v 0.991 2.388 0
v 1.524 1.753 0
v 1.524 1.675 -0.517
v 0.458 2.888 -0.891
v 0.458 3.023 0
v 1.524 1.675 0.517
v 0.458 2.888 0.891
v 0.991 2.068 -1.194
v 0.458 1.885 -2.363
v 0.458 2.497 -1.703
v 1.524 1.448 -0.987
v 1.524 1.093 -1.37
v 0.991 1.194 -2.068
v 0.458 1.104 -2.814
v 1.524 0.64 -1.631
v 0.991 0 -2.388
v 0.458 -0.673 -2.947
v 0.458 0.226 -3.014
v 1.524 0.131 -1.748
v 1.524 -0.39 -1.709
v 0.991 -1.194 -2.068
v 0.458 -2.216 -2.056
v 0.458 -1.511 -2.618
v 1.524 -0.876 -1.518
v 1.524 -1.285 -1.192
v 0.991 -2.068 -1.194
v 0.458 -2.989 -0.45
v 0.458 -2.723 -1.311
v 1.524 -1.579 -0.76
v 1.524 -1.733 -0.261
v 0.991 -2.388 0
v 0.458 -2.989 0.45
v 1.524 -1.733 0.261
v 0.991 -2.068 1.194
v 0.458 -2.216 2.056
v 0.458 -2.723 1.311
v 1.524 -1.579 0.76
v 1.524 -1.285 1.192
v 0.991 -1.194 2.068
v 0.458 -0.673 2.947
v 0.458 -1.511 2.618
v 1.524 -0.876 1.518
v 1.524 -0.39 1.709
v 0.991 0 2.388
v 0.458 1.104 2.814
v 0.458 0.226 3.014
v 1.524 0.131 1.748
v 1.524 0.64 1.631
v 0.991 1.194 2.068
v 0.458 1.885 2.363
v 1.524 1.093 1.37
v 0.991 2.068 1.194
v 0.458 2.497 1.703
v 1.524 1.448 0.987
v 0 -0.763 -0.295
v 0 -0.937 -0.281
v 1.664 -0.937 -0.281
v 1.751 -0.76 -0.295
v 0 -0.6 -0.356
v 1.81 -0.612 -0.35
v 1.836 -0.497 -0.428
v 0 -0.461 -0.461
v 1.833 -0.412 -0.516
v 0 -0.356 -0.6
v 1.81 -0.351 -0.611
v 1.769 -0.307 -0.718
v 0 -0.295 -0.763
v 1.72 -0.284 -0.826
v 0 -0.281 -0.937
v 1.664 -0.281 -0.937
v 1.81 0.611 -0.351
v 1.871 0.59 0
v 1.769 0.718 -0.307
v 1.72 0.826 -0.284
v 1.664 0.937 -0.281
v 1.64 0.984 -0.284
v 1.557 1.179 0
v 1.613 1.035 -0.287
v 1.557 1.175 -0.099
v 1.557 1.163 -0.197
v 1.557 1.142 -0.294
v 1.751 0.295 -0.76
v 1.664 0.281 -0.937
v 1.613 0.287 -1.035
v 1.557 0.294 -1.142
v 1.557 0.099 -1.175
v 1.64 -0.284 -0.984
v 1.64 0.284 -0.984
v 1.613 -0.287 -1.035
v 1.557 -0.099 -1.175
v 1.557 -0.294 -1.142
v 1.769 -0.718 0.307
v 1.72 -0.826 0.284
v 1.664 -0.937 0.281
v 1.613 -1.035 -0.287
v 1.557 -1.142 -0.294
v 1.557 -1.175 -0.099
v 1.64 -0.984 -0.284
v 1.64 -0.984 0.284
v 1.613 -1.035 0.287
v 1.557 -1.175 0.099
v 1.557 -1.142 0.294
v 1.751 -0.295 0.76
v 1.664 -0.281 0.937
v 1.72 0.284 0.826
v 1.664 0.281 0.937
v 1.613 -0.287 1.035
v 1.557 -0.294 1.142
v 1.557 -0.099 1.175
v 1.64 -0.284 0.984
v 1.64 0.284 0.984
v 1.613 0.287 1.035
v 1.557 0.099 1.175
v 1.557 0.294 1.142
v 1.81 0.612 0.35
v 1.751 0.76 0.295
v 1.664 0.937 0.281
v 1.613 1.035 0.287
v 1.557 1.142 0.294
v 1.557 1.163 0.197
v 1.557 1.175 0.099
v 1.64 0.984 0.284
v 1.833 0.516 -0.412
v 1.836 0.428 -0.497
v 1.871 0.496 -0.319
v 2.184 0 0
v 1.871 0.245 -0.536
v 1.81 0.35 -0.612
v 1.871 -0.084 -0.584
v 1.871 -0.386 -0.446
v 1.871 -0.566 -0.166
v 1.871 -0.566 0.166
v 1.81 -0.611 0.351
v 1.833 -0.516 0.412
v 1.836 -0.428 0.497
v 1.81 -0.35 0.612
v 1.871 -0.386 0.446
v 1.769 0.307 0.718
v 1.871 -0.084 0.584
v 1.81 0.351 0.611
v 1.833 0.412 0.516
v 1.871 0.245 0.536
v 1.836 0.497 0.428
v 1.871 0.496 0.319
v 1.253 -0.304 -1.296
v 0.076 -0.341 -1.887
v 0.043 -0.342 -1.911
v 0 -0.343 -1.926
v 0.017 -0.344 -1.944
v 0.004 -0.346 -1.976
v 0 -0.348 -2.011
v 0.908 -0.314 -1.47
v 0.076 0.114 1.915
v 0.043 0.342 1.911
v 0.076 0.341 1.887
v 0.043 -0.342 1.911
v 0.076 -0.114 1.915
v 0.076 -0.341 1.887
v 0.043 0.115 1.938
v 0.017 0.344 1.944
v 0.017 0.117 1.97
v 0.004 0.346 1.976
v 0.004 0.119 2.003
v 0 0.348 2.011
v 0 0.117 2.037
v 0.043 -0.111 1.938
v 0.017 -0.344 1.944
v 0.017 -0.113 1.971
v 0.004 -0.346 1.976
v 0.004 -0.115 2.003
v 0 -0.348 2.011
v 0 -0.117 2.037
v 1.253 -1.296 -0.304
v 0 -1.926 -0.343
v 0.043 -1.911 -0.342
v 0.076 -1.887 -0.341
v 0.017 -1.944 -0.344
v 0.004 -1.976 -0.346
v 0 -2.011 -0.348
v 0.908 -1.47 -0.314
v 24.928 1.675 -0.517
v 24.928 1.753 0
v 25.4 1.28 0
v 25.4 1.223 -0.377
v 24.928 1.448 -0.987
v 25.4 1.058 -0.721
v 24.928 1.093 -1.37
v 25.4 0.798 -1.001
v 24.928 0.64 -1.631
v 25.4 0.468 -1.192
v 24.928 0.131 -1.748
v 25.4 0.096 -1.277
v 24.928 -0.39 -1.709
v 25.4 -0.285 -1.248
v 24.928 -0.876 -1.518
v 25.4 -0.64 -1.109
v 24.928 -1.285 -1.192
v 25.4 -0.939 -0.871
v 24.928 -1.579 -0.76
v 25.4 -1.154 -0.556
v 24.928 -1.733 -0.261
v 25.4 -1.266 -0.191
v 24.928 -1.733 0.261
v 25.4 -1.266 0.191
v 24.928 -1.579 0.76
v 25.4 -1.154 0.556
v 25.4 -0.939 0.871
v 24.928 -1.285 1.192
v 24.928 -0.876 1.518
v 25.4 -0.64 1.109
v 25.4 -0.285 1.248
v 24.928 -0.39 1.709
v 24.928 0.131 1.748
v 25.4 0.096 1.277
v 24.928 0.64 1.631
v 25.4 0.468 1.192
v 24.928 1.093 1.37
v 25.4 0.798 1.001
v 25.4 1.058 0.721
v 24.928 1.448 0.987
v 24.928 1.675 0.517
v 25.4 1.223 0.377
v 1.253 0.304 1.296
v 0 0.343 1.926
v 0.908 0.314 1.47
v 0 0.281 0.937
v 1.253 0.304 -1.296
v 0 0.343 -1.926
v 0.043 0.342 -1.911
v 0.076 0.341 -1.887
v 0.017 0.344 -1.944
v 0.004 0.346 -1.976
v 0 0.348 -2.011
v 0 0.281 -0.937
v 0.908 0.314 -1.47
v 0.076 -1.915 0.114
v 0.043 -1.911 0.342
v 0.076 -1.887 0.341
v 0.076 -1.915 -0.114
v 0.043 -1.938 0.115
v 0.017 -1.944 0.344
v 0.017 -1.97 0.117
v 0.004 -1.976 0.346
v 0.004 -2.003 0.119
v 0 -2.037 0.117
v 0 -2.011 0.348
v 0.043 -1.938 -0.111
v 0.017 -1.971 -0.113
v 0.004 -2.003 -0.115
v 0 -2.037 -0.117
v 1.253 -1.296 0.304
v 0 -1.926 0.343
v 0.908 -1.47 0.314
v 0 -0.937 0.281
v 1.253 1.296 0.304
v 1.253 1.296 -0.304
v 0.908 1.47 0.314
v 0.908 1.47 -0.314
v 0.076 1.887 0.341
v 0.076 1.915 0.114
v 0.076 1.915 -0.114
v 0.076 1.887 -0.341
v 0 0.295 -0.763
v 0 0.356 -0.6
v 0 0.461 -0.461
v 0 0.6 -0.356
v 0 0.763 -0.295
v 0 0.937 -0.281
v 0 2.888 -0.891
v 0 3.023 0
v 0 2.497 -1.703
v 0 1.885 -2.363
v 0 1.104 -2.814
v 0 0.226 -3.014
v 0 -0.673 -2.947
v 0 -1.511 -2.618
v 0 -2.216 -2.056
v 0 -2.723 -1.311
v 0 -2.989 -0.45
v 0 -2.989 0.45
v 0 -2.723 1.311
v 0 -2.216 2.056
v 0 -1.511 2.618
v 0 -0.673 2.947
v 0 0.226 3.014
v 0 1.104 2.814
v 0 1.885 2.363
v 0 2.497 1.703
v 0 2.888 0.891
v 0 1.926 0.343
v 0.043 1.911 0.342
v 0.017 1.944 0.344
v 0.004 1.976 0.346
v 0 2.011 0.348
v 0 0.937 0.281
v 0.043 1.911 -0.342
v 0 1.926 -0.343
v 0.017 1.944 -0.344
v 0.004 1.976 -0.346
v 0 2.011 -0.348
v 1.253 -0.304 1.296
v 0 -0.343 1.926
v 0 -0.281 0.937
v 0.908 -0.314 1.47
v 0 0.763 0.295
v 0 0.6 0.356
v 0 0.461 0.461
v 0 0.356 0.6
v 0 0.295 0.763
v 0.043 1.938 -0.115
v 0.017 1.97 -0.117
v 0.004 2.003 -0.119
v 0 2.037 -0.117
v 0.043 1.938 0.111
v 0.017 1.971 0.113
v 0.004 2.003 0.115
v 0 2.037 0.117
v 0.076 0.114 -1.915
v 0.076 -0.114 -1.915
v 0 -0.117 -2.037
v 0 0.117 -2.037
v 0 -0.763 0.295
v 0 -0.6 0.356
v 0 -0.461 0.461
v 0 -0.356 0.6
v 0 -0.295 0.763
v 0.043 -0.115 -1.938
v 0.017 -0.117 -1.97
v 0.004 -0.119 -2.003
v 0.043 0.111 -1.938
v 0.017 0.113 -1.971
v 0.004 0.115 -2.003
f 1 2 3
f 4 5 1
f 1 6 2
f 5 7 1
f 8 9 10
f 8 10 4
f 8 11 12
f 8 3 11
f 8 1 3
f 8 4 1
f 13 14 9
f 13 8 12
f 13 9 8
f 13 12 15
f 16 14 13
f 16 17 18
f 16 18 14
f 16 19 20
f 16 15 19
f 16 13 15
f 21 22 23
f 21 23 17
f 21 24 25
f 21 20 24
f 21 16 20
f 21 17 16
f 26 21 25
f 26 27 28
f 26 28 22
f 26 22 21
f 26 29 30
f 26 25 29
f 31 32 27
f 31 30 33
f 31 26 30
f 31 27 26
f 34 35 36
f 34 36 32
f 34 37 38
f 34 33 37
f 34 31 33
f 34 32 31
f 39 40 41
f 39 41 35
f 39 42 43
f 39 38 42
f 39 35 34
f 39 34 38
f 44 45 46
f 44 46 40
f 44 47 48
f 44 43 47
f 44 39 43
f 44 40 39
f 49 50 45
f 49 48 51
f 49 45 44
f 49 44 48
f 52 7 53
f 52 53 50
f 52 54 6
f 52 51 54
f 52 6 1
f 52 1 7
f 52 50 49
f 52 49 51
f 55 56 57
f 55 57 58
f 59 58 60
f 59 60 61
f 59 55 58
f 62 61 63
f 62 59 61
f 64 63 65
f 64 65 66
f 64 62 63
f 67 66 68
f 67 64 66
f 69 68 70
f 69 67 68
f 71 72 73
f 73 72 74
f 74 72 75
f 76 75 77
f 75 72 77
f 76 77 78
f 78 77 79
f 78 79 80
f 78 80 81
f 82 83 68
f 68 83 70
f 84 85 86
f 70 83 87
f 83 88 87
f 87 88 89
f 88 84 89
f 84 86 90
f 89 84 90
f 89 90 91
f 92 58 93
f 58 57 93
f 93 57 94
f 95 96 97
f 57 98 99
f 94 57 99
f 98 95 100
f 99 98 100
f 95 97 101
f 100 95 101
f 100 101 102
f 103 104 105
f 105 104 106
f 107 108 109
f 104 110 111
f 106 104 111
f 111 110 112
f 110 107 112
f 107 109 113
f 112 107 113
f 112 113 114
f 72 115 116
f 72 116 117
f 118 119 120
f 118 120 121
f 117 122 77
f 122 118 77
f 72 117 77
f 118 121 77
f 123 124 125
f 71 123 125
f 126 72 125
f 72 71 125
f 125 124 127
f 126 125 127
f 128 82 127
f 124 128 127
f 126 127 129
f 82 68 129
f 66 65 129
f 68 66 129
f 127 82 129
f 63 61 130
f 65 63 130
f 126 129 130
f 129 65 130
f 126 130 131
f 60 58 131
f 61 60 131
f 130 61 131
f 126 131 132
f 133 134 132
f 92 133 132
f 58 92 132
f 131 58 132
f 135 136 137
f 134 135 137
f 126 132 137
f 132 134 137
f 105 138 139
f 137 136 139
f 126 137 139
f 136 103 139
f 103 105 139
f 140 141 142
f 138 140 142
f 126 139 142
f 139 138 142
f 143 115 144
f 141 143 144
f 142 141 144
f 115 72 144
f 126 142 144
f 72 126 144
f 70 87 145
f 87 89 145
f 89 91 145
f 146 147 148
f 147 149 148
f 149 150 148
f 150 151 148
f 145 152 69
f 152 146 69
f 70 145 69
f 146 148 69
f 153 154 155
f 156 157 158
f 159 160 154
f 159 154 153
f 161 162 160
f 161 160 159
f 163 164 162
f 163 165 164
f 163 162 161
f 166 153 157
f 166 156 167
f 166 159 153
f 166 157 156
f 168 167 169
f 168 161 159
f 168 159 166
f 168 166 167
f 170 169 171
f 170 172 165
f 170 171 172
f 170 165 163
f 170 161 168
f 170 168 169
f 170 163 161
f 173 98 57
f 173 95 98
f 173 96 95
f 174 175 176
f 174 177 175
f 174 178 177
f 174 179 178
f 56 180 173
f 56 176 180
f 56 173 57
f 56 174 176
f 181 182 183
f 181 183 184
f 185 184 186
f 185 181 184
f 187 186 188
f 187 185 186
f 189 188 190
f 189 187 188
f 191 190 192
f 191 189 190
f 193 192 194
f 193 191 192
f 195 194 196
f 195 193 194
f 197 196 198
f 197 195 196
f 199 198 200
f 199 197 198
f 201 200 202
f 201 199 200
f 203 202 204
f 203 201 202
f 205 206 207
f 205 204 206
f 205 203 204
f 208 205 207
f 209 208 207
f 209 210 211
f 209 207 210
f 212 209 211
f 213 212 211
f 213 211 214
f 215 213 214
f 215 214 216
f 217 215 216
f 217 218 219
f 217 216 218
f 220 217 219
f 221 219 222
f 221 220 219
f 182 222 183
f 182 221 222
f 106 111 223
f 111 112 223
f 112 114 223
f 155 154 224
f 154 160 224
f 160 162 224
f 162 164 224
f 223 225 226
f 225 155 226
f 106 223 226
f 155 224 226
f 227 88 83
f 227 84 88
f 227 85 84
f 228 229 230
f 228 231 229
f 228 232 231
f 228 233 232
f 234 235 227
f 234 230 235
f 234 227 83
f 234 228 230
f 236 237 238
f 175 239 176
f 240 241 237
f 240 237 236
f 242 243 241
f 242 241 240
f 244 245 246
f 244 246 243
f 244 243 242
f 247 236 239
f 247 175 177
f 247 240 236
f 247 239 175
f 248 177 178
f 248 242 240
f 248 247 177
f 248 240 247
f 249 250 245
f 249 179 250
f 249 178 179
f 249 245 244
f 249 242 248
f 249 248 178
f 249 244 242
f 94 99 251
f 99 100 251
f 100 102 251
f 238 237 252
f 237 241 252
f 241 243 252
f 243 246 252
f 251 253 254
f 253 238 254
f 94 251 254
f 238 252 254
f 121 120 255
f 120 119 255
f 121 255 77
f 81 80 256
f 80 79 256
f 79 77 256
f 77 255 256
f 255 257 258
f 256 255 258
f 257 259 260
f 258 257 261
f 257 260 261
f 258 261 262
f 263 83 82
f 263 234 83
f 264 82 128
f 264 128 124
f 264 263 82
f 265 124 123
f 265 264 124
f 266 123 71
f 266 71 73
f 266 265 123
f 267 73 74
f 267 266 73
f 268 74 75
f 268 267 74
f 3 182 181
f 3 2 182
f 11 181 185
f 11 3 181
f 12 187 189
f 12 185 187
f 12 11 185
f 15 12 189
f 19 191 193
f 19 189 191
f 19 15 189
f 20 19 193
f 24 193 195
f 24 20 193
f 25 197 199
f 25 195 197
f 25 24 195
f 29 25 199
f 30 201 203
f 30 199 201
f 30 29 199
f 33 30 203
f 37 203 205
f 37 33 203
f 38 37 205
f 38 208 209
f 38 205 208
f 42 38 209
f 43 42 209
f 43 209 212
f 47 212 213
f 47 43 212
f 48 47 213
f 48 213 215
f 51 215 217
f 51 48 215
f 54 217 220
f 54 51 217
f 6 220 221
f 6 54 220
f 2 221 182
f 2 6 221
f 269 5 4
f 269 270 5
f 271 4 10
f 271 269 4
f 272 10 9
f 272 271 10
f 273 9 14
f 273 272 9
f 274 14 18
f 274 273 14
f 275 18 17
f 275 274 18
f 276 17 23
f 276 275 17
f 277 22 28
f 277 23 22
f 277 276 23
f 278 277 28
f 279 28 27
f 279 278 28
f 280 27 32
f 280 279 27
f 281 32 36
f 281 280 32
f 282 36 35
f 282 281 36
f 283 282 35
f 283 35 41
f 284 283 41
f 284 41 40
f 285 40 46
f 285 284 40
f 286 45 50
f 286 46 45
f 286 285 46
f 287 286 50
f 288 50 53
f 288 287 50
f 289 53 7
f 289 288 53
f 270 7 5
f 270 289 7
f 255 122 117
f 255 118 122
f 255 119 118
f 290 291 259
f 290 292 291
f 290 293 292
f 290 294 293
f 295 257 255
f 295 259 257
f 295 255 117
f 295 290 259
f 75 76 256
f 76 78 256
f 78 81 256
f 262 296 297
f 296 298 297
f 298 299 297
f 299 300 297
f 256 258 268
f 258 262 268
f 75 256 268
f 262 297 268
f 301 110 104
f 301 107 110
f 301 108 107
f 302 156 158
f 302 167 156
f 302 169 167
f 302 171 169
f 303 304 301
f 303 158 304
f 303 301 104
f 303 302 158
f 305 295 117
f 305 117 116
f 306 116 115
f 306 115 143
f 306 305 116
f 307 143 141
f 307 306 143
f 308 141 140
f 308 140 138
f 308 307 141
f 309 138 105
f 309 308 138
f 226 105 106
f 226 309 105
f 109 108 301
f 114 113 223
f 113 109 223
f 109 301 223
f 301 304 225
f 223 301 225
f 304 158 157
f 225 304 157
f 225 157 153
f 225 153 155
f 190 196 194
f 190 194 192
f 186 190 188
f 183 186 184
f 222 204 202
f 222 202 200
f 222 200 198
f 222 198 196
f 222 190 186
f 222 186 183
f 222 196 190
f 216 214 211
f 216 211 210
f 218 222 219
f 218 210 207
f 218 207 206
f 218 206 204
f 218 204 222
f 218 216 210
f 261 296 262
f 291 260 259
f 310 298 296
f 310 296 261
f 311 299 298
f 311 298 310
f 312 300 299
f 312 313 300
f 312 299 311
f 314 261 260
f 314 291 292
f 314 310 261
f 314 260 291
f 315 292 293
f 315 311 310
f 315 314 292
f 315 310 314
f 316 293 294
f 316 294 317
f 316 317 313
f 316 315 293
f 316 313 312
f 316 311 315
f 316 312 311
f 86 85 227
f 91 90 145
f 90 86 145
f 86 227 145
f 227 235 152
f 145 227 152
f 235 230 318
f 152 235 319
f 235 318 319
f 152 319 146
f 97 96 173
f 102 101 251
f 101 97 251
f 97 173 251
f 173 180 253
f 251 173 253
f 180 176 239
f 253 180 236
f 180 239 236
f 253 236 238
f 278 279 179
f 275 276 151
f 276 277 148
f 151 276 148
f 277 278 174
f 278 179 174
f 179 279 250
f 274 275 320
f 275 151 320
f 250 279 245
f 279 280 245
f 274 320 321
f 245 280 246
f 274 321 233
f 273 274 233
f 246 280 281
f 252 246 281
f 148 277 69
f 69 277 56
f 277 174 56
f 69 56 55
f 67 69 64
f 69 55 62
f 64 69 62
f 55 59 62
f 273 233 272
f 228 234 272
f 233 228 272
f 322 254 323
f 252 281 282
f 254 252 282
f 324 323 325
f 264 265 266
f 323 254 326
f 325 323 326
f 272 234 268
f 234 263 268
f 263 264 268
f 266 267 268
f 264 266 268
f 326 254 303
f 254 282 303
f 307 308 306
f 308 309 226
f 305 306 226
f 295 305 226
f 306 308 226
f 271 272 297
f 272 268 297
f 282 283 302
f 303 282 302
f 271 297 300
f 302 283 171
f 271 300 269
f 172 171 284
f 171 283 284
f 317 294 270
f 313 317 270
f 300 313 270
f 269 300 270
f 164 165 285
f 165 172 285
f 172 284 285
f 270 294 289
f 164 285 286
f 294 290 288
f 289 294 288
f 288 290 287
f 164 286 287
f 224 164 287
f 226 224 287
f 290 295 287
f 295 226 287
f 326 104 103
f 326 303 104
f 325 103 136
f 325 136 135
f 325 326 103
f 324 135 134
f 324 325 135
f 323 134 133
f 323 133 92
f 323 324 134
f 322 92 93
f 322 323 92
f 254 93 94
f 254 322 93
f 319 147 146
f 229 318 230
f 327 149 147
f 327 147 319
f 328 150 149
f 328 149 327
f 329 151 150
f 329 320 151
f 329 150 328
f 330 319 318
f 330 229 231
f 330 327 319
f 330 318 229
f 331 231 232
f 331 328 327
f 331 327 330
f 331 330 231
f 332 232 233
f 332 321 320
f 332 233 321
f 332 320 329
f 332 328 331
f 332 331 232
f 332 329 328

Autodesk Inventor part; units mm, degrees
ref_plane "YZ Plane" through (0, 0, 0) normal (1, 0, 0) x (0, 1, 0)
ref_plane "XZ Plane" through (0, 0, 0) normal (0, 1, 0) x (-1, 0, 0)
sketch "Sketch1" plane through (0, 0, 0) normal (0, 0, 1) x (1, 0, 0)
  line L0 (2.1844, 0) -> (25.4, 0)
  line L1 (25.4, 0) -> (25.4, 1.7526)
  line L2 (25.4, 1.7526) -> (1.524, 1.7526)
  line L3 (0.4583, 3.0226) -> (0, 3.0226)
  line L4 (-5.08, 0) -> (30.48, 0) projected
  line L5 (0, -0.6045) -> (0, 3.6271) projected
  line L6 (0, 1.9558) -> (1.5573, 1.1793)
  line L7 (1.5573, 1.1793) -> (2.1844, 0)
  line L8 (1.524, 1.7526) -> (0.4583, 3.0226)
  line L9 (0, 3.0226) -> (0, 1.9558)
  dimension "d2" = 3.5052
  dimension "d3" = 6.0452
  dimension "d4" = 2.1844
  dimension "d5" = 3.9116
  dimension "d6" = 26.5
  dimension "d7" = 62
  dimension "d13" = 50
  dimension "d14" = 1.524
  dimension "d15" = 25.4
revolve "Body" add sketch "Sketch1" angle 360 about axis through (2.1844, 0, 0) along (1, 0, 0) contours L7 L6 L5 L3 L8 L2 L1 L0
sketch "Sketch2" plane through (0, 0, 0) normal (-1, 0, 0) x (0, 0, 1)
  line L0 (0, -4.2316) -> (0, 4.2316) projected
  line L1 (-4.2316, 0) -> (4.2316, 0) projected
  line L2 (0, 1.9558) -> (0, 0) construction
  line L3 (0, 0) -> (1.9558, 0) construction
  arc A0 (0.6519, 0) -> (0, 0.6519) centre (0, 0) ccw
  line L4 (0, 0) -> (0.7947, 0.7947) construction
  arc A1 (0.9779, 0) -> (0, 0.9779) centre (0, 0) ccw construction
  line L5 (0.3429, 1.9255) -> (0.2811, 0.9366)
  line L6 (1.9255, 0.3429) -> (0.9366, 0.2811)
  arc A2 (0.2811, 0.9366) -> (0.9366, 0.2811) centre (0.8981, 0.8981) ccw
  arc A3 (1.9558, 0) -> (1.9255, 0.3429) centre (0, 0) ccw
  arc A4 (0.3429, 1.9255) -> (0, 1.9558) centre (0, 0) ccw
  arc A5 (1.9255, 0.3429) -> (0.3429, 1.9255) centre (0, 0) ccw
  line L7 (0.3429, -1.9255) -> (0.2811, -0.9366)
  line L8 (1.9255, -0.3429) -> (0.9366, -0.2811)
  arc A6 (0.9366, -0.2811) -> (0.2811, -0.9366) centre (0.8981, -0.8981) ccw
  arc A7 (1.9255, -0.3429) -> (1.9558, 0) centre (0, 0) ccw
  arc A8 (0, -1.9558) -> (0.3429, -1.9255) centre (0, 0) ccw
  arc A9 (0.3429, -1.9255) -> (1.9255, -0.3429) centre (0, 0) ccw
  line L9 (-0.3429, 1.9255) -> (-0.2811, 0.9366)
  line L10 (-1.9255, 0.3429) -> (-0.9366, 0.2811)
  arc A10 (-0.9366, 0.2811) -> (-0.2811, 0.9366) centre (-0.8981, 0.8981) ccw
  arc A11 (-1.9255, 0.3429) -> (-1.9558, 0) centre (0, 0) ccw
  arc A12 (0, 1.9558) -> (-0.3429, 1.9255) centre (0, 0) ccw
  arc A13 (-0.3429, 1.9255) -> (-1.9255, 0.3429) centre (0, 0) ccw
  arc A14 (-1.9255, -0.3429) -> (-0.3429, -1.9255) centre (0, 0) ccw
  arc A15 (-0.3429, -1.9255) -> (0, -1.9558) centre (0, 0) ccw
  arc A16 (-1.9558, 0) -> (-1.9255, -0.3429) centre (0, 0) ccw
  line L11 (-1.9255, -0.3429) -> (-0.9366, -0.2811)
  arc A17 (-0.2811, -0.9366) -> (-0.9366, -0.2811) centre (-0.8981, -0.8981) ccw
  line L12 (-0.3429, -1.9255) -> (-0.2811, -0.9366)
  dimension "d18" = 45
  dimension "d19" = 1.3039
  dimension "d20" = 1.9558
  dimension "d21" = 3.9116
  dimension "d22" = 0.3429
extrude "Slot" add sketch "Sketch2" against normal up to next contours A2 L5 A5 L6 | L9 A10 L10 A13 | L7 A6 L8 A9 | A14 L11 A17 L12
fillet "Fillet1" radius 0.1372 4 edges at (0, 1.9558, 0) (0, 0, 1.9558) (0, -1.9558, 0) (0, 0, -1.9558)
thread "Thread" size "6-32 UNC" class "2A" standard "ANSI Unified Screw Threads" length 19.05
chamfer "Chamfer1" distance 0.4723 distance2 0.4723 1 edges at (25.4, -1.7526, 0) measured on face at (25.4, -0.4373, -0.5742)
ref_plane "Work Plane2" through (2.032, 0, 0) normal (0, 1, 0) x (1, 0, 0)
equation "\"d2\" = GD"
equation "\"d3\" = KOD"
equation "\"d4\" = INTI"
equation "\"d5\" = SDM"
equation "\"d13\" = 0.5 * SEWI"
equation "\"d14\" = KOH"
equation "\"d15\" = NLG"
equation "\"d19\" = 0.333333 * SDM"
equation "\"d20\" = 0.5 * SDM"
equation "\"d21\" = SDM"
equation "\"d22\" = 0.5 * SBR"
equation "\"d45\" = INTI"
equation "\"d25\" = 0.2 * SBR"
equation "\"d9\" = GEL"
equation "\"d11\" = -0.5 * SPD + 0.5 * GD"
equation "\"d12\" = GUL"
equation "\"GD\" = NND"
equation "\"NLG\" = 25.4"
equation "\"GEL\" = 19.05"
equation "\"KOD\" = 6.0452"
equation "\"KOH\" = 1.524"
equation "\"SDM\" = 3.9116"
equation "\"INTI\" = 2.1844"
equation "\"SBR\" = 0.6858"
equation "\"GUL\" = -0.5 * SPD + 0.5 * NND"
equation "\"SPD\" = 2.56064"
equation "\"SEWI\" = 100deg"
equation "\"d0\" = NLG"
equation "\"d1\" = KOH"
equation "\"d17\" = SDM"
equation "\"TOA\" = 30deg"
equation "\"EPV\" = 2.99461"
equation "\"THREADDIA\" = 3.5052"
equation "\"BDM\" = NND"
equation "\"NND\" = 3.5052"
equation "\"GAL\" = 0.79375"
equation "\"GD1\" = SPD"
properties part number "ANSI B18.6.3 - 6-32 UNC x 1, CRFCHMSTII(2)" material "Steel, Mild"
